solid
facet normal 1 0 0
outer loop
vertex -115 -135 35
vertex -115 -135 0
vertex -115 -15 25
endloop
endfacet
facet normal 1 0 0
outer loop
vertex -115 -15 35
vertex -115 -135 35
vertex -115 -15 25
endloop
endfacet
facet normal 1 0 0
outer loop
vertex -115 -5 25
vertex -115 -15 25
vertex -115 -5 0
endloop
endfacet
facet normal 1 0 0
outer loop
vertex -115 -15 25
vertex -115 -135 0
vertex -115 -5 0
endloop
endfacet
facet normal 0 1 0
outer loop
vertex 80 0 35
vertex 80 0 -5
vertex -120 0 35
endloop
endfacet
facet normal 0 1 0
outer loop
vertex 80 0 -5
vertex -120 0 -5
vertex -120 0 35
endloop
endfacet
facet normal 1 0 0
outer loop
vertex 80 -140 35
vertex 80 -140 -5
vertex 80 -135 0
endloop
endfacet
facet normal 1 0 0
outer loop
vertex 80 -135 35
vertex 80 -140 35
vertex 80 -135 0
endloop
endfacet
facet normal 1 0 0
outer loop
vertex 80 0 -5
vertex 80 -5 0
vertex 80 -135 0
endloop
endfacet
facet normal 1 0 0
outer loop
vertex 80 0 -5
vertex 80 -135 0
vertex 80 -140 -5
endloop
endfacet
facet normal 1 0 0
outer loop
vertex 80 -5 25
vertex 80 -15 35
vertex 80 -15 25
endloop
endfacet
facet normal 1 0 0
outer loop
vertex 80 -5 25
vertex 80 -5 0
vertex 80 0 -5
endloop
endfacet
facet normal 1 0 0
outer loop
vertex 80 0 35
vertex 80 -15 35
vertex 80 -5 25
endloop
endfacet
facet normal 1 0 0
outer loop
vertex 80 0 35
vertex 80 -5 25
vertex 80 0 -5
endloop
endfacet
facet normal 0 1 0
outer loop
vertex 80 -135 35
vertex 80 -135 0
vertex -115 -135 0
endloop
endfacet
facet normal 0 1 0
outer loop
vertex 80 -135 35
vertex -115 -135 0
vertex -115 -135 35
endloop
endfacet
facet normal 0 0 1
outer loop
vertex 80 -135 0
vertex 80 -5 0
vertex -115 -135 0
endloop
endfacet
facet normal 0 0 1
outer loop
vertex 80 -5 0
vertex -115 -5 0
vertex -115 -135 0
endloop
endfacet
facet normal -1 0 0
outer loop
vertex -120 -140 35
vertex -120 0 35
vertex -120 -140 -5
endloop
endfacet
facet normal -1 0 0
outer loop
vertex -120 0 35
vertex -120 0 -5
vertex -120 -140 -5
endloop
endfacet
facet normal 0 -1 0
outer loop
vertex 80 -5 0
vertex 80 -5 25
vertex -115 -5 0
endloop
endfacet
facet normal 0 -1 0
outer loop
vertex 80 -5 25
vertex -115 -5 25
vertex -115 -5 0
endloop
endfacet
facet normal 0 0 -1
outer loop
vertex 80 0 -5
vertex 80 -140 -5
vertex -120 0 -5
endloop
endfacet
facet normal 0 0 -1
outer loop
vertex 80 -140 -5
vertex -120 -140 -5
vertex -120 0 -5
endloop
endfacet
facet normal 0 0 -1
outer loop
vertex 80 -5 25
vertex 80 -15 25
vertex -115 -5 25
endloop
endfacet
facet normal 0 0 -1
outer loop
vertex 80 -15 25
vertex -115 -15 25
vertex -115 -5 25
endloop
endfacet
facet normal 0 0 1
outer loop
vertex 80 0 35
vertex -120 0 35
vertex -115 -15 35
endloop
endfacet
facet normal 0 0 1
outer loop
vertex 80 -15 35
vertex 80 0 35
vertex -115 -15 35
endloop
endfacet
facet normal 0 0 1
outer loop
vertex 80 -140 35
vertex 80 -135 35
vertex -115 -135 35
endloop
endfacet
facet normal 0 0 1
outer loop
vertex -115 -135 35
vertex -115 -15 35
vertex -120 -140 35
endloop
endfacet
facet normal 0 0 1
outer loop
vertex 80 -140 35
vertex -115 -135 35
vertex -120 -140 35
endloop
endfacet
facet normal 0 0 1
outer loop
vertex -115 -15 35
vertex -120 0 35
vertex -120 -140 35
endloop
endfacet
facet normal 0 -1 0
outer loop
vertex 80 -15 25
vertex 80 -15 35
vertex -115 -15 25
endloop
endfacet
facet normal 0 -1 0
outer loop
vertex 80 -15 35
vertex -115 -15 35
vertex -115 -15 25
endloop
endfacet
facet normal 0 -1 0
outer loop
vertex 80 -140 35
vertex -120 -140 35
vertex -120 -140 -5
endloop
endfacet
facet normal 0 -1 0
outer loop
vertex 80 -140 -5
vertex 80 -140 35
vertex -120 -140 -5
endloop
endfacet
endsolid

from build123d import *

# Parameters (mm, degrees)
F0_W     = 115
F0_H     = 120
F0_H_2   = 10
F1_DEPTH = 5
F2_DEPTH = 35
F3_DEPTH = 25
F4_DEPTH = 80


with BuildPart() as f1:
    # F0 (on Top) → F1 (new body)
    with BuildSketch(Plane.XY):
        with Locations((-57.5, -75)):
            Rectangle(F0_W, F0_H)
        Polygon((0, -5), (0, 0), (-115, 0), (-120, 0), (-120, -140), (-115, -140), (0, -140), (0, -135), (-115, -135), (-115, -15), (-115, -5), align=None)
        with Locations((-57.5, -10)):
            Rectangle(F0_W, F0_H_2)
    extrude(amount=-F1_DEPTH)

    # F0 (on Top) → F2 (join)
    with BuildSketch(Plane.XY):
        with Locations((-57.5, -10)):
            Rectangle(F0_W, F0_H_2)
        Polygon((0, -5), (0, 0), (-115, 0), (-120, 0), (-120, -140), (-115, -140), (0, -140), (0, -135), (-115, -135), (-115, -15), (-115, -5), align=None)
    extrude(amount=F2_DEPTH)

    # F0 (on Top) → F3 (cut)
    with BuildSketch(Plane.XY):
        with Locations((-57.5, -10)):
            Rectangle(F0_W, F0_H_2)
    extrude(amount=F3_DEPTH, mode=Mode.SUBTRACT)

    # F2_face (on face) → F4 (join)
    with BuildSketch(Plane(origin=(0, -64.782609, 6.413043), x_dir=(0, 1, 0), z_dir=(1, 0, 0))):
        Polygon((-75.217391, 28.586957), (-75.217391, -11.413043), (64.782609, -11.413043), (64.782609, 28.586957), (49.782609, 28.586957), (49.782609, 18.586957), (59.782609, 18.586957), (59.782609, -6.413043), (-70.217391, -6.413043), (-70.217391, 28.586957), align=None)
    extrude(amount=F4_DEPTH)


solid = f1.part
